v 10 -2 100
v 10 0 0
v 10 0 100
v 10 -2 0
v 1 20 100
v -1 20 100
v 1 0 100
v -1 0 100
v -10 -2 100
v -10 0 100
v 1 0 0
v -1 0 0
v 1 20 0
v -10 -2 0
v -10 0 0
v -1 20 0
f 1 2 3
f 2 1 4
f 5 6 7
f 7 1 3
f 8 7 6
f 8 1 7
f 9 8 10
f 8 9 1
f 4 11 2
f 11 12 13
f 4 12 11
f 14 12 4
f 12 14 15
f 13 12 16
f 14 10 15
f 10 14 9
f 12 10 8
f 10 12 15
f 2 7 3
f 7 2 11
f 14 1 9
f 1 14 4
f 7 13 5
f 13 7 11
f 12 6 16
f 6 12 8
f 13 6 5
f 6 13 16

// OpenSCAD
module T_profile(width, height, thickness=2, size=100) {
    translate([width/-2, -thickness, 0])
        cube([width, thickness, size]);
    
    translate([thickness/-2, 0, 0])
        cube([thickness, height, size]);
}

T_profile(20, 20);
